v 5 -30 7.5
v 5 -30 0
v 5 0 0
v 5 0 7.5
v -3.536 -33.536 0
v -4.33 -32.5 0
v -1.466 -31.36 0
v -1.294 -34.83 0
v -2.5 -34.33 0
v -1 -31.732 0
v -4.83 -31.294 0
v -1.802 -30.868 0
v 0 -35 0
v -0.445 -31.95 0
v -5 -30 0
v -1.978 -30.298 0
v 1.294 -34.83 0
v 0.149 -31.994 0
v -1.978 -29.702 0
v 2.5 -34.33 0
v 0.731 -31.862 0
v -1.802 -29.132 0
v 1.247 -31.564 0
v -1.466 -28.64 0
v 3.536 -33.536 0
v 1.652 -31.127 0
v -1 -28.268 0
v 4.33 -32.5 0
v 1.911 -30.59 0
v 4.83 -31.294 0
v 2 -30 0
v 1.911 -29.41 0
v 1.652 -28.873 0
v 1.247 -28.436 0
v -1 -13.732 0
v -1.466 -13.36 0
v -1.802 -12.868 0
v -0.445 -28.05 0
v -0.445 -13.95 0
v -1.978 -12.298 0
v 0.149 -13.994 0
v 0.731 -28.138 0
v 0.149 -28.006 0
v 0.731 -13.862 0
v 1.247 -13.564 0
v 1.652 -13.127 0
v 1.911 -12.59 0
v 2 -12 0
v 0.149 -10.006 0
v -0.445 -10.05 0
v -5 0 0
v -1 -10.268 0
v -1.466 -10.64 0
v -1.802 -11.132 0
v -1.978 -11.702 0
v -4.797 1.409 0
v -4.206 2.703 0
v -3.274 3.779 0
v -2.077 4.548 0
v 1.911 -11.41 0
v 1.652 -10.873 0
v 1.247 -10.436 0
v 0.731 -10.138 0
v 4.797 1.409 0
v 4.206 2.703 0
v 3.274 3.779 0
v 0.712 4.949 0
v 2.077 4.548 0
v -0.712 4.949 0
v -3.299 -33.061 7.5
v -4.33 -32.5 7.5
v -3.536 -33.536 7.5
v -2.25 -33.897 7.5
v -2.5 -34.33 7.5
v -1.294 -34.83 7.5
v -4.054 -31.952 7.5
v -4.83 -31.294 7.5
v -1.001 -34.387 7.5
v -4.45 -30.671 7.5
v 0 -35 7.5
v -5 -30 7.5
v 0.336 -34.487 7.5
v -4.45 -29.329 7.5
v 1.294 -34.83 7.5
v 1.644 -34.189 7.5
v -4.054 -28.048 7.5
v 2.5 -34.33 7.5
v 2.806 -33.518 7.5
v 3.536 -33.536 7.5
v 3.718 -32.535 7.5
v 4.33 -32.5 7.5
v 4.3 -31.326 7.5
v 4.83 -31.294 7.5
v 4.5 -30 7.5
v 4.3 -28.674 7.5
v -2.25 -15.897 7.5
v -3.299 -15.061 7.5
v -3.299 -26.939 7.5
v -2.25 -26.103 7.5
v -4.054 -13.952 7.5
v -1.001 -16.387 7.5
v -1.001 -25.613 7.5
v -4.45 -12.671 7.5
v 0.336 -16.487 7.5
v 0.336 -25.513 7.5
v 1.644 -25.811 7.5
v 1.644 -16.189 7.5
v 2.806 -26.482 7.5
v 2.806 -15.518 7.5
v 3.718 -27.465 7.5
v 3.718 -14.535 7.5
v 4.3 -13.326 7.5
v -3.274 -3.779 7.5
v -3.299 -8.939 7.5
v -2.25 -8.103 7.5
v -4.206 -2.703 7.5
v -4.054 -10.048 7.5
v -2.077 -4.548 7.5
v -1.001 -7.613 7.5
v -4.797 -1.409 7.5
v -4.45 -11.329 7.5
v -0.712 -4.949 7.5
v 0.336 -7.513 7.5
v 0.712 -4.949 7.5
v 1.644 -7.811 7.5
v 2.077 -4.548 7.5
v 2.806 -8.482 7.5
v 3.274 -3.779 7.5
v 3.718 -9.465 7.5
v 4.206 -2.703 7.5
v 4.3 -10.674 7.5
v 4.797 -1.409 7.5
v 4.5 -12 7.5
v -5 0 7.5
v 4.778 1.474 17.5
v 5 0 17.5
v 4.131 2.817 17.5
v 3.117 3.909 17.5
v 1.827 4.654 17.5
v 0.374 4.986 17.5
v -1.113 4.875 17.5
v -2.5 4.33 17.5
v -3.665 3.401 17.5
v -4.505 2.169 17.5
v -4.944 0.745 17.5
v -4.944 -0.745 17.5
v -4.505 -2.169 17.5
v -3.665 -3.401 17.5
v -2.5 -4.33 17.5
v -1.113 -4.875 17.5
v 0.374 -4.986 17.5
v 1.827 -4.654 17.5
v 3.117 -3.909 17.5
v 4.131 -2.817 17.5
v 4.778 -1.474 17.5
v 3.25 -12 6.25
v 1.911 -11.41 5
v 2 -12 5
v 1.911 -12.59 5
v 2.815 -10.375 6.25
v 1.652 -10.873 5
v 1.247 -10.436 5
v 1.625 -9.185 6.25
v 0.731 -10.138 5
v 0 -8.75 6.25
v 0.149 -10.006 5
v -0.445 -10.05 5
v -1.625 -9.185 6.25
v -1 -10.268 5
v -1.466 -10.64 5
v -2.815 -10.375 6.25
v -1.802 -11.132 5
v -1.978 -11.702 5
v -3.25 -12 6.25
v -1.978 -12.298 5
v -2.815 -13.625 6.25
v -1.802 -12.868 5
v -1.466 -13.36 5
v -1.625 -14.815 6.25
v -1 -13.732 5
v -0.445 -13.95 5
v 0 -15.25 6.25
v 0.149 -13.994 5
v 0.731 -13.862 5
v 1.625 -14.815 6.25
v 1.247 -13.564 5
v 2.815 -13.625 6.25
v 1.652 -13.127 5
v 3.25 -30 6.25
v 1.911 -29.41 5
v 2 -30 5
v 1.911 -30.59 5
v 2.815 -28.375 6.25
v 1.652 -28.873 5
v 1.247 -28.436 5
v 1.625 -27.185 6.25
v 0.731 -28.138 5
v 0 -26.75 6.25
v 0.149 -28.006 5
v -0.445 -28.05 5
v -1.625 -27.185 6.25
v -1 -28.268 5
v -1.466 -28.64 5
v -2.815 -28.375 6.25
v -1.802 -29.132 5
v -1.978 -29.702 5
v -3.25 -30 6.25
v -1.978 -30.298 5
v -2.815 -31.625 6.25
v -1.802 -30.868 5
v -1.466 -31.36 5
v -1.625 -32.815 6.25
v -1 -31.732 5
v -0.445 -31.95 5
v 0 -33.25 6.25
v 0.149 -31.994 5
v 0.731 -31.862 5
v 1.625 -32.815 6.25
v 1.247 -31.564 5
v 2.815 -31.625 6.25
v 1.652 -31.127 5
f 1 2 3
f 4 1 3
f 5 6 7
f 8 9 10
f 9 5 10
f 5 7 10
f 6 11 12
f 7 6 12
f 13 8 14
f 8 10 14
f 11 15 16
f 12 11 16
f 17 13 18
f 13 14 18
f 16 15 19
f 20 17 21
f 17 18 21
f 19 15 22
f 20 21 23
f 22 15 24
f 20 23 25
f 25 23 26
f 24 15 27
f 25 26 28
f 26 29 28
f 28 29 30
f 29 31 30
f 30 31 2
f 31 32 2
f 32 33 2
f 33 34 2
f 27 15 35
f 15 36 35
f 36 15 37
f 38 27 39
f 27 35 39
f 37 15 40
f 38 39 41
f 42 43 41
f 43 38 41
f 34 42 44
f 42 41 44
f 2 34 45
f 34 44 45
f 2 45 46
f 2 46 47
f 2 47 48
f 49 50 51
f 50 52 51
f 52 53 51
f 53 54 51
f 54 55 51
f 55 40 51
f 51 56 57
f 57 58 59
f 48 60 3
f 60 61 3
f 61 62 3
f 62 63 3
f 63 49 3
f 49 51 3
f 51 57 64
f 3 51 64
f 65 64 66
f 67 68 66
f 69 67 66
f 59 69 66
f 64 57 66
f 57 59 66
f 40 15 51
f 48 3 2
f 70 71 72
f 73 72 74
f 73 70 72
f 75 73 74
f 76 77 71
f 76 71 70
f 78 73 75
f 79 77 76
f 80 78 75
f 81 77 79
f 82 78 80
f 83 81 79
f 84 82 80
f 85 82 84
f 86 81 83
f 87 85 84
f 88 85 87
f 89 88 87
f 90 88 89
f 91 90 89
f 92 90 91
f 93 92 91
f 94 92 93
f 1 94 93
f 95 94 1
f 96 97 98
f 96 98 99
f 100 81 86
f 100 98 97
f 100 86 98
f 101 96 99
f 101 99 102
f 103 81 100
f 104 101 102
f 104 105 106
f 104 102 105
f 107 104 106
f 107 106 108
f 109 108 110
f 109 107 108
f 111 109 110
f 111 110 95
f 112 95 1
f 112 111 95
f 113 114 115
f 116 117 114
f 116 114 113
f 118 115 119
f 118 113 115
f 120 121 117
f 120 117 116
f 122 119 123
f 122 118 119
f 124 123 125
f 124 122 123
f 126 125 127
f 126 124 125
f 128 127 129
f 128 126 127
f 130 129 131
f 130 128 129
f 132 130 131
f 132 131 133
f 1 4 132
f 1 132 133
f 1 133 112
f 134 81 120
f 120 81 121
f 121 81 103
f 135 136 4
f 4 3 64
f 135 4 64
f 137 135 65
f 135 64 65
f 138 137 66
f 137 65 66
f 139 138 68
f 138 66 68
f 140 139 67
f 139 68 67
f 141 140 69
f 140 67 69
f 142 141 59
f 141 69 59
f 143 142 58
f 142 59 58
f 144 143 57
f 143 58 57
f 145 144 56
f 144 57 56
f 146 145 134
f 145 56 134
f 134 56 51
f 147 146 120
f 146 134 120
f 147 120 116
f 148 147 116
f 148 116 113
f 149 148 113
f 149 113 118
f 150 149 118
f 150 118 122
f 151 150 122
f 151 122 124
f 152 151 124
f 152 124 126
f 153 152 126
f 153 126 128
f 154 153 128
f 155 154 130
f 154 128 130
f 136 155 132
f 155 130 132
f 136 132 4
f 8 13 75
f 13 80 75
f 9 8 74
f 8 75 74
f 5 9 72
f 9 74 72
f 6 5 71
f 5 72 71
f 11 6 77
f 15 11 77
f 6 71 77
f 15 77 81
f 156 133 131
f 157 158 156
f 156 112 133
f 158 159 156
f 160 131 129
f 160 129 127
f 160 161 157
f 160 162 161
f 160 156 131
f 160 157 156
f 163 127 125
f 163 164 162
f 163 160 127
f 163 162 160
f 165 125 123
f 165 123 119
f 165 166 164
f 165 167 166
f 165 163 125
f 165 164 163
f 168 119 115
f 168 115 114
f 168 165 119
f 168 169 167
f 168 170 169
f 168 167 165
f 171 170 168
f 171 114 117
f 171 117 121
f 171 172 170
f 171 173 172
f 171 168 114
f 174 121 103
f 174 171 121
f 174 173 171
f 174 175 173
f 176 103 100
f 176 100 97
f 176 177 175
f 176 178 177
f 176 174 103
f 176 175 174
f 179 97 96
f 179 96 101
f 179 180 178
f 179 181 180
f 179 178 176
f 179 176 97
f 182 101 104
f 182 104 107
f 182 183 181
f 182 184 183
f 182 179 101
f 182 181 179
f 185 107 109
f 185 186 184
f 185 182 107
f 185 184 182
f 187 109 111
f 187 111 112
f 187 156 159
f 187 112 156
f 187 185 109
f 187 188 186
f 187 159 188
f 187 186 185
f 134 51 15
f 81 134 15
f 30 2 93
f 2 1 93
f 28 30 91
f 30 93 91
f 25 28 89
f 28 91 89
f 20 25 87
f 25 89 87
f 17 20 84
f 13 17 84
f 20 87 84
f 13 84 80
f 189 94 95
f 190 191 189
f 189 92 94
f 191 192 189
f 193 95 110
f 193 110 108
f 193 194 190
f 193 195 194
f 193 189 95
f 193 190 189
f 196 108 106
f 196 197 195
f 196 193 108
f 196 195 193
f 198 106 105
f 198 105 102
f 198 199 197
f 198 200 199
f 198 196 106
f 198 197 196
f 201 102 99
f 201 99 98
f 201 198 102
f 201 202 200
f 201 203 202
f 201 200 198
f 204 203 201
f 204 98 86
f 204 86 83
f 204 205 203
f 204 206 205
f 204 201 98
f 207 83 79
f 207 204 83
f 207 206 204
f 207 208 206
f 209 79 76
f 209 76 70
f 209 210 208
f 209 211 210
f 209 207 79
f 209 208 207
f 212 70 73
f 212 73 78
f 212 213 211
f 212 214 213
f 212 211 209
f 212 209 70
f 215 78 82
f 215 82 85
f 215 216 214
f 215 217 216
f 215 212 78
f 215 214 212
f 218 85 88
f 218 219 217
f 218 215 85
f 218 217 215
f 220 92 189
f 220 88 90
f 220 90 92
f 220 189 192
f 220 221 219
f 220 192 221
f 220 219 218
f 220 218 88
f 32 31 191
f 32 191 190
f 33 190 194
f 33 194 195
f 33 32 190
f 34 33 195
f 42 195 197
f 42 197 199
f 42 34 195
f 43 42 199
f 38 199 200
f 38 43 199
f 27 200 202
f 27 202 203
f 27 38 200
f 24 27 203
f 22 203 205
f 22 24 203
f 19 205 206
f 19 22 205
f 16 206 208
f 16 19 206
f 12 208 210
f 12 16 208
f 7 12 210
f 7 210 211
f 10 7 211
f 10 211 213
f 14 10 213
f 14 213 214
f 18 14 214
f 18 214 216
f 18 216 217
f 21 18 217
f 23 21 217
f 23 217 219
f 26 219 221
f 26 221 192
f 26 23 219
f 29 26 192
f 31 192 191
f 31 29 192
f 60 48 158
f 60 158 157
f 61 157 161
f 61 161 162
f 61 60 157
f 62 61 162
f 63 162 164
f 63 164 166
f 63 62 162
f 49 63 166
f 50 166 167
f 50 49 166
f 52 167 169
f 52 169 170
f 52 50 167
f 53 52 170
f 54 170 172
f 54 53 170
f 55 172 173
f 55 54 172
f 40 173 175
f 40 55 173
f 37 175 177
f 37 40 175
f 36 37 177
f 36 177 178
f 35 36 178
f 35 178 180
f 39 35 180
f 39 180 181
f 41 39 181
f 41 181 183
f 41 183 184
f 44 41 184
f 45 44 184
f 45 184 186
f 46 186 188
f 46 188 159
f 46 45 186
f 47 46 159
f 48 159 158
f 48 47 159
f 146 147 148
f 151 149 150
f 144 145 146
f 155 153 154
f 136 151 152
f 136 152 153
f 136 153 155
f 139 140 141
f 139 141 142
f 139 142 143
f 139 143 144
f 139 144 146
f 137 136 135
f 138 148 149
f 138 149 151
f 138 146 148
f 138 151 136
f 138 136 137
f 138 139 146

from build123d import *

# Parameters (mm, degrees)
F0_R     = 2
F1_DEPTH = 7.5
F2_DEPTH = 17.5
F3_SIZE2 = 2.5
F3_SIZE  = 2.5
F4_R     = 4.99999


# Not quite as in the source:
# - a fillet or chamfer is up to 0.001 mm smaller than in the source, because OpenCascade refuses the exact size


with BuildPart() as f1:
    # F0 (on Top) → F1 (new body)
    with BuildSketch(Plane.XY):
        with BuildLine():
            Line((5, -35), (5, 0))
            ThreePointArc((5, 0), (0, -5), (-5, 0))
            Line((-5, 0), (-5, -35))
            Line((-5, -35), (0, -35))
            Line((0, -35), (5, -35))
        make_face()
        with Locations((0, -30)):
            Circle(F0_R, mode=Mode.SUBTRACT)
        with Locations((0, -12)):
            Circle(F0_R, mode=Mode.SUBTRACT)
    extrude(amount=F1_DEPTH)

    # F0 (on Top) → F2 (join)
    with BuildSketch(Plane.XY):
        with BuildLine():
            ThreePointArc((-5, 0), (0, -5), (5, 0))
            ThreePointArc((5, 0), (0, 5), (-5, 0))
        make_face()
    extrude(amount=F2_DEPTH)

    # F3
    f3_edges = [f1.edges().sort_by_distance(p)[0] for p in [
        (-2, -12, 7.5),
        (-2, -30, 7.5),
    ]]
    chamfer(f3_edges, length=F3_SIZE, length2=F3_SIZE2)

    # F4 (radius 5 in the source; OpenCascade refuses exactly that, so slightly less here)
    f4_edges = [f1.edges().sort_by_distance(p)[0] for p in [
        (-5, -35, 3.75),
        (5, -35, 3.75),
    ]]
    fillet(f4_edges, radius=F4_R)


solid = f1.part
